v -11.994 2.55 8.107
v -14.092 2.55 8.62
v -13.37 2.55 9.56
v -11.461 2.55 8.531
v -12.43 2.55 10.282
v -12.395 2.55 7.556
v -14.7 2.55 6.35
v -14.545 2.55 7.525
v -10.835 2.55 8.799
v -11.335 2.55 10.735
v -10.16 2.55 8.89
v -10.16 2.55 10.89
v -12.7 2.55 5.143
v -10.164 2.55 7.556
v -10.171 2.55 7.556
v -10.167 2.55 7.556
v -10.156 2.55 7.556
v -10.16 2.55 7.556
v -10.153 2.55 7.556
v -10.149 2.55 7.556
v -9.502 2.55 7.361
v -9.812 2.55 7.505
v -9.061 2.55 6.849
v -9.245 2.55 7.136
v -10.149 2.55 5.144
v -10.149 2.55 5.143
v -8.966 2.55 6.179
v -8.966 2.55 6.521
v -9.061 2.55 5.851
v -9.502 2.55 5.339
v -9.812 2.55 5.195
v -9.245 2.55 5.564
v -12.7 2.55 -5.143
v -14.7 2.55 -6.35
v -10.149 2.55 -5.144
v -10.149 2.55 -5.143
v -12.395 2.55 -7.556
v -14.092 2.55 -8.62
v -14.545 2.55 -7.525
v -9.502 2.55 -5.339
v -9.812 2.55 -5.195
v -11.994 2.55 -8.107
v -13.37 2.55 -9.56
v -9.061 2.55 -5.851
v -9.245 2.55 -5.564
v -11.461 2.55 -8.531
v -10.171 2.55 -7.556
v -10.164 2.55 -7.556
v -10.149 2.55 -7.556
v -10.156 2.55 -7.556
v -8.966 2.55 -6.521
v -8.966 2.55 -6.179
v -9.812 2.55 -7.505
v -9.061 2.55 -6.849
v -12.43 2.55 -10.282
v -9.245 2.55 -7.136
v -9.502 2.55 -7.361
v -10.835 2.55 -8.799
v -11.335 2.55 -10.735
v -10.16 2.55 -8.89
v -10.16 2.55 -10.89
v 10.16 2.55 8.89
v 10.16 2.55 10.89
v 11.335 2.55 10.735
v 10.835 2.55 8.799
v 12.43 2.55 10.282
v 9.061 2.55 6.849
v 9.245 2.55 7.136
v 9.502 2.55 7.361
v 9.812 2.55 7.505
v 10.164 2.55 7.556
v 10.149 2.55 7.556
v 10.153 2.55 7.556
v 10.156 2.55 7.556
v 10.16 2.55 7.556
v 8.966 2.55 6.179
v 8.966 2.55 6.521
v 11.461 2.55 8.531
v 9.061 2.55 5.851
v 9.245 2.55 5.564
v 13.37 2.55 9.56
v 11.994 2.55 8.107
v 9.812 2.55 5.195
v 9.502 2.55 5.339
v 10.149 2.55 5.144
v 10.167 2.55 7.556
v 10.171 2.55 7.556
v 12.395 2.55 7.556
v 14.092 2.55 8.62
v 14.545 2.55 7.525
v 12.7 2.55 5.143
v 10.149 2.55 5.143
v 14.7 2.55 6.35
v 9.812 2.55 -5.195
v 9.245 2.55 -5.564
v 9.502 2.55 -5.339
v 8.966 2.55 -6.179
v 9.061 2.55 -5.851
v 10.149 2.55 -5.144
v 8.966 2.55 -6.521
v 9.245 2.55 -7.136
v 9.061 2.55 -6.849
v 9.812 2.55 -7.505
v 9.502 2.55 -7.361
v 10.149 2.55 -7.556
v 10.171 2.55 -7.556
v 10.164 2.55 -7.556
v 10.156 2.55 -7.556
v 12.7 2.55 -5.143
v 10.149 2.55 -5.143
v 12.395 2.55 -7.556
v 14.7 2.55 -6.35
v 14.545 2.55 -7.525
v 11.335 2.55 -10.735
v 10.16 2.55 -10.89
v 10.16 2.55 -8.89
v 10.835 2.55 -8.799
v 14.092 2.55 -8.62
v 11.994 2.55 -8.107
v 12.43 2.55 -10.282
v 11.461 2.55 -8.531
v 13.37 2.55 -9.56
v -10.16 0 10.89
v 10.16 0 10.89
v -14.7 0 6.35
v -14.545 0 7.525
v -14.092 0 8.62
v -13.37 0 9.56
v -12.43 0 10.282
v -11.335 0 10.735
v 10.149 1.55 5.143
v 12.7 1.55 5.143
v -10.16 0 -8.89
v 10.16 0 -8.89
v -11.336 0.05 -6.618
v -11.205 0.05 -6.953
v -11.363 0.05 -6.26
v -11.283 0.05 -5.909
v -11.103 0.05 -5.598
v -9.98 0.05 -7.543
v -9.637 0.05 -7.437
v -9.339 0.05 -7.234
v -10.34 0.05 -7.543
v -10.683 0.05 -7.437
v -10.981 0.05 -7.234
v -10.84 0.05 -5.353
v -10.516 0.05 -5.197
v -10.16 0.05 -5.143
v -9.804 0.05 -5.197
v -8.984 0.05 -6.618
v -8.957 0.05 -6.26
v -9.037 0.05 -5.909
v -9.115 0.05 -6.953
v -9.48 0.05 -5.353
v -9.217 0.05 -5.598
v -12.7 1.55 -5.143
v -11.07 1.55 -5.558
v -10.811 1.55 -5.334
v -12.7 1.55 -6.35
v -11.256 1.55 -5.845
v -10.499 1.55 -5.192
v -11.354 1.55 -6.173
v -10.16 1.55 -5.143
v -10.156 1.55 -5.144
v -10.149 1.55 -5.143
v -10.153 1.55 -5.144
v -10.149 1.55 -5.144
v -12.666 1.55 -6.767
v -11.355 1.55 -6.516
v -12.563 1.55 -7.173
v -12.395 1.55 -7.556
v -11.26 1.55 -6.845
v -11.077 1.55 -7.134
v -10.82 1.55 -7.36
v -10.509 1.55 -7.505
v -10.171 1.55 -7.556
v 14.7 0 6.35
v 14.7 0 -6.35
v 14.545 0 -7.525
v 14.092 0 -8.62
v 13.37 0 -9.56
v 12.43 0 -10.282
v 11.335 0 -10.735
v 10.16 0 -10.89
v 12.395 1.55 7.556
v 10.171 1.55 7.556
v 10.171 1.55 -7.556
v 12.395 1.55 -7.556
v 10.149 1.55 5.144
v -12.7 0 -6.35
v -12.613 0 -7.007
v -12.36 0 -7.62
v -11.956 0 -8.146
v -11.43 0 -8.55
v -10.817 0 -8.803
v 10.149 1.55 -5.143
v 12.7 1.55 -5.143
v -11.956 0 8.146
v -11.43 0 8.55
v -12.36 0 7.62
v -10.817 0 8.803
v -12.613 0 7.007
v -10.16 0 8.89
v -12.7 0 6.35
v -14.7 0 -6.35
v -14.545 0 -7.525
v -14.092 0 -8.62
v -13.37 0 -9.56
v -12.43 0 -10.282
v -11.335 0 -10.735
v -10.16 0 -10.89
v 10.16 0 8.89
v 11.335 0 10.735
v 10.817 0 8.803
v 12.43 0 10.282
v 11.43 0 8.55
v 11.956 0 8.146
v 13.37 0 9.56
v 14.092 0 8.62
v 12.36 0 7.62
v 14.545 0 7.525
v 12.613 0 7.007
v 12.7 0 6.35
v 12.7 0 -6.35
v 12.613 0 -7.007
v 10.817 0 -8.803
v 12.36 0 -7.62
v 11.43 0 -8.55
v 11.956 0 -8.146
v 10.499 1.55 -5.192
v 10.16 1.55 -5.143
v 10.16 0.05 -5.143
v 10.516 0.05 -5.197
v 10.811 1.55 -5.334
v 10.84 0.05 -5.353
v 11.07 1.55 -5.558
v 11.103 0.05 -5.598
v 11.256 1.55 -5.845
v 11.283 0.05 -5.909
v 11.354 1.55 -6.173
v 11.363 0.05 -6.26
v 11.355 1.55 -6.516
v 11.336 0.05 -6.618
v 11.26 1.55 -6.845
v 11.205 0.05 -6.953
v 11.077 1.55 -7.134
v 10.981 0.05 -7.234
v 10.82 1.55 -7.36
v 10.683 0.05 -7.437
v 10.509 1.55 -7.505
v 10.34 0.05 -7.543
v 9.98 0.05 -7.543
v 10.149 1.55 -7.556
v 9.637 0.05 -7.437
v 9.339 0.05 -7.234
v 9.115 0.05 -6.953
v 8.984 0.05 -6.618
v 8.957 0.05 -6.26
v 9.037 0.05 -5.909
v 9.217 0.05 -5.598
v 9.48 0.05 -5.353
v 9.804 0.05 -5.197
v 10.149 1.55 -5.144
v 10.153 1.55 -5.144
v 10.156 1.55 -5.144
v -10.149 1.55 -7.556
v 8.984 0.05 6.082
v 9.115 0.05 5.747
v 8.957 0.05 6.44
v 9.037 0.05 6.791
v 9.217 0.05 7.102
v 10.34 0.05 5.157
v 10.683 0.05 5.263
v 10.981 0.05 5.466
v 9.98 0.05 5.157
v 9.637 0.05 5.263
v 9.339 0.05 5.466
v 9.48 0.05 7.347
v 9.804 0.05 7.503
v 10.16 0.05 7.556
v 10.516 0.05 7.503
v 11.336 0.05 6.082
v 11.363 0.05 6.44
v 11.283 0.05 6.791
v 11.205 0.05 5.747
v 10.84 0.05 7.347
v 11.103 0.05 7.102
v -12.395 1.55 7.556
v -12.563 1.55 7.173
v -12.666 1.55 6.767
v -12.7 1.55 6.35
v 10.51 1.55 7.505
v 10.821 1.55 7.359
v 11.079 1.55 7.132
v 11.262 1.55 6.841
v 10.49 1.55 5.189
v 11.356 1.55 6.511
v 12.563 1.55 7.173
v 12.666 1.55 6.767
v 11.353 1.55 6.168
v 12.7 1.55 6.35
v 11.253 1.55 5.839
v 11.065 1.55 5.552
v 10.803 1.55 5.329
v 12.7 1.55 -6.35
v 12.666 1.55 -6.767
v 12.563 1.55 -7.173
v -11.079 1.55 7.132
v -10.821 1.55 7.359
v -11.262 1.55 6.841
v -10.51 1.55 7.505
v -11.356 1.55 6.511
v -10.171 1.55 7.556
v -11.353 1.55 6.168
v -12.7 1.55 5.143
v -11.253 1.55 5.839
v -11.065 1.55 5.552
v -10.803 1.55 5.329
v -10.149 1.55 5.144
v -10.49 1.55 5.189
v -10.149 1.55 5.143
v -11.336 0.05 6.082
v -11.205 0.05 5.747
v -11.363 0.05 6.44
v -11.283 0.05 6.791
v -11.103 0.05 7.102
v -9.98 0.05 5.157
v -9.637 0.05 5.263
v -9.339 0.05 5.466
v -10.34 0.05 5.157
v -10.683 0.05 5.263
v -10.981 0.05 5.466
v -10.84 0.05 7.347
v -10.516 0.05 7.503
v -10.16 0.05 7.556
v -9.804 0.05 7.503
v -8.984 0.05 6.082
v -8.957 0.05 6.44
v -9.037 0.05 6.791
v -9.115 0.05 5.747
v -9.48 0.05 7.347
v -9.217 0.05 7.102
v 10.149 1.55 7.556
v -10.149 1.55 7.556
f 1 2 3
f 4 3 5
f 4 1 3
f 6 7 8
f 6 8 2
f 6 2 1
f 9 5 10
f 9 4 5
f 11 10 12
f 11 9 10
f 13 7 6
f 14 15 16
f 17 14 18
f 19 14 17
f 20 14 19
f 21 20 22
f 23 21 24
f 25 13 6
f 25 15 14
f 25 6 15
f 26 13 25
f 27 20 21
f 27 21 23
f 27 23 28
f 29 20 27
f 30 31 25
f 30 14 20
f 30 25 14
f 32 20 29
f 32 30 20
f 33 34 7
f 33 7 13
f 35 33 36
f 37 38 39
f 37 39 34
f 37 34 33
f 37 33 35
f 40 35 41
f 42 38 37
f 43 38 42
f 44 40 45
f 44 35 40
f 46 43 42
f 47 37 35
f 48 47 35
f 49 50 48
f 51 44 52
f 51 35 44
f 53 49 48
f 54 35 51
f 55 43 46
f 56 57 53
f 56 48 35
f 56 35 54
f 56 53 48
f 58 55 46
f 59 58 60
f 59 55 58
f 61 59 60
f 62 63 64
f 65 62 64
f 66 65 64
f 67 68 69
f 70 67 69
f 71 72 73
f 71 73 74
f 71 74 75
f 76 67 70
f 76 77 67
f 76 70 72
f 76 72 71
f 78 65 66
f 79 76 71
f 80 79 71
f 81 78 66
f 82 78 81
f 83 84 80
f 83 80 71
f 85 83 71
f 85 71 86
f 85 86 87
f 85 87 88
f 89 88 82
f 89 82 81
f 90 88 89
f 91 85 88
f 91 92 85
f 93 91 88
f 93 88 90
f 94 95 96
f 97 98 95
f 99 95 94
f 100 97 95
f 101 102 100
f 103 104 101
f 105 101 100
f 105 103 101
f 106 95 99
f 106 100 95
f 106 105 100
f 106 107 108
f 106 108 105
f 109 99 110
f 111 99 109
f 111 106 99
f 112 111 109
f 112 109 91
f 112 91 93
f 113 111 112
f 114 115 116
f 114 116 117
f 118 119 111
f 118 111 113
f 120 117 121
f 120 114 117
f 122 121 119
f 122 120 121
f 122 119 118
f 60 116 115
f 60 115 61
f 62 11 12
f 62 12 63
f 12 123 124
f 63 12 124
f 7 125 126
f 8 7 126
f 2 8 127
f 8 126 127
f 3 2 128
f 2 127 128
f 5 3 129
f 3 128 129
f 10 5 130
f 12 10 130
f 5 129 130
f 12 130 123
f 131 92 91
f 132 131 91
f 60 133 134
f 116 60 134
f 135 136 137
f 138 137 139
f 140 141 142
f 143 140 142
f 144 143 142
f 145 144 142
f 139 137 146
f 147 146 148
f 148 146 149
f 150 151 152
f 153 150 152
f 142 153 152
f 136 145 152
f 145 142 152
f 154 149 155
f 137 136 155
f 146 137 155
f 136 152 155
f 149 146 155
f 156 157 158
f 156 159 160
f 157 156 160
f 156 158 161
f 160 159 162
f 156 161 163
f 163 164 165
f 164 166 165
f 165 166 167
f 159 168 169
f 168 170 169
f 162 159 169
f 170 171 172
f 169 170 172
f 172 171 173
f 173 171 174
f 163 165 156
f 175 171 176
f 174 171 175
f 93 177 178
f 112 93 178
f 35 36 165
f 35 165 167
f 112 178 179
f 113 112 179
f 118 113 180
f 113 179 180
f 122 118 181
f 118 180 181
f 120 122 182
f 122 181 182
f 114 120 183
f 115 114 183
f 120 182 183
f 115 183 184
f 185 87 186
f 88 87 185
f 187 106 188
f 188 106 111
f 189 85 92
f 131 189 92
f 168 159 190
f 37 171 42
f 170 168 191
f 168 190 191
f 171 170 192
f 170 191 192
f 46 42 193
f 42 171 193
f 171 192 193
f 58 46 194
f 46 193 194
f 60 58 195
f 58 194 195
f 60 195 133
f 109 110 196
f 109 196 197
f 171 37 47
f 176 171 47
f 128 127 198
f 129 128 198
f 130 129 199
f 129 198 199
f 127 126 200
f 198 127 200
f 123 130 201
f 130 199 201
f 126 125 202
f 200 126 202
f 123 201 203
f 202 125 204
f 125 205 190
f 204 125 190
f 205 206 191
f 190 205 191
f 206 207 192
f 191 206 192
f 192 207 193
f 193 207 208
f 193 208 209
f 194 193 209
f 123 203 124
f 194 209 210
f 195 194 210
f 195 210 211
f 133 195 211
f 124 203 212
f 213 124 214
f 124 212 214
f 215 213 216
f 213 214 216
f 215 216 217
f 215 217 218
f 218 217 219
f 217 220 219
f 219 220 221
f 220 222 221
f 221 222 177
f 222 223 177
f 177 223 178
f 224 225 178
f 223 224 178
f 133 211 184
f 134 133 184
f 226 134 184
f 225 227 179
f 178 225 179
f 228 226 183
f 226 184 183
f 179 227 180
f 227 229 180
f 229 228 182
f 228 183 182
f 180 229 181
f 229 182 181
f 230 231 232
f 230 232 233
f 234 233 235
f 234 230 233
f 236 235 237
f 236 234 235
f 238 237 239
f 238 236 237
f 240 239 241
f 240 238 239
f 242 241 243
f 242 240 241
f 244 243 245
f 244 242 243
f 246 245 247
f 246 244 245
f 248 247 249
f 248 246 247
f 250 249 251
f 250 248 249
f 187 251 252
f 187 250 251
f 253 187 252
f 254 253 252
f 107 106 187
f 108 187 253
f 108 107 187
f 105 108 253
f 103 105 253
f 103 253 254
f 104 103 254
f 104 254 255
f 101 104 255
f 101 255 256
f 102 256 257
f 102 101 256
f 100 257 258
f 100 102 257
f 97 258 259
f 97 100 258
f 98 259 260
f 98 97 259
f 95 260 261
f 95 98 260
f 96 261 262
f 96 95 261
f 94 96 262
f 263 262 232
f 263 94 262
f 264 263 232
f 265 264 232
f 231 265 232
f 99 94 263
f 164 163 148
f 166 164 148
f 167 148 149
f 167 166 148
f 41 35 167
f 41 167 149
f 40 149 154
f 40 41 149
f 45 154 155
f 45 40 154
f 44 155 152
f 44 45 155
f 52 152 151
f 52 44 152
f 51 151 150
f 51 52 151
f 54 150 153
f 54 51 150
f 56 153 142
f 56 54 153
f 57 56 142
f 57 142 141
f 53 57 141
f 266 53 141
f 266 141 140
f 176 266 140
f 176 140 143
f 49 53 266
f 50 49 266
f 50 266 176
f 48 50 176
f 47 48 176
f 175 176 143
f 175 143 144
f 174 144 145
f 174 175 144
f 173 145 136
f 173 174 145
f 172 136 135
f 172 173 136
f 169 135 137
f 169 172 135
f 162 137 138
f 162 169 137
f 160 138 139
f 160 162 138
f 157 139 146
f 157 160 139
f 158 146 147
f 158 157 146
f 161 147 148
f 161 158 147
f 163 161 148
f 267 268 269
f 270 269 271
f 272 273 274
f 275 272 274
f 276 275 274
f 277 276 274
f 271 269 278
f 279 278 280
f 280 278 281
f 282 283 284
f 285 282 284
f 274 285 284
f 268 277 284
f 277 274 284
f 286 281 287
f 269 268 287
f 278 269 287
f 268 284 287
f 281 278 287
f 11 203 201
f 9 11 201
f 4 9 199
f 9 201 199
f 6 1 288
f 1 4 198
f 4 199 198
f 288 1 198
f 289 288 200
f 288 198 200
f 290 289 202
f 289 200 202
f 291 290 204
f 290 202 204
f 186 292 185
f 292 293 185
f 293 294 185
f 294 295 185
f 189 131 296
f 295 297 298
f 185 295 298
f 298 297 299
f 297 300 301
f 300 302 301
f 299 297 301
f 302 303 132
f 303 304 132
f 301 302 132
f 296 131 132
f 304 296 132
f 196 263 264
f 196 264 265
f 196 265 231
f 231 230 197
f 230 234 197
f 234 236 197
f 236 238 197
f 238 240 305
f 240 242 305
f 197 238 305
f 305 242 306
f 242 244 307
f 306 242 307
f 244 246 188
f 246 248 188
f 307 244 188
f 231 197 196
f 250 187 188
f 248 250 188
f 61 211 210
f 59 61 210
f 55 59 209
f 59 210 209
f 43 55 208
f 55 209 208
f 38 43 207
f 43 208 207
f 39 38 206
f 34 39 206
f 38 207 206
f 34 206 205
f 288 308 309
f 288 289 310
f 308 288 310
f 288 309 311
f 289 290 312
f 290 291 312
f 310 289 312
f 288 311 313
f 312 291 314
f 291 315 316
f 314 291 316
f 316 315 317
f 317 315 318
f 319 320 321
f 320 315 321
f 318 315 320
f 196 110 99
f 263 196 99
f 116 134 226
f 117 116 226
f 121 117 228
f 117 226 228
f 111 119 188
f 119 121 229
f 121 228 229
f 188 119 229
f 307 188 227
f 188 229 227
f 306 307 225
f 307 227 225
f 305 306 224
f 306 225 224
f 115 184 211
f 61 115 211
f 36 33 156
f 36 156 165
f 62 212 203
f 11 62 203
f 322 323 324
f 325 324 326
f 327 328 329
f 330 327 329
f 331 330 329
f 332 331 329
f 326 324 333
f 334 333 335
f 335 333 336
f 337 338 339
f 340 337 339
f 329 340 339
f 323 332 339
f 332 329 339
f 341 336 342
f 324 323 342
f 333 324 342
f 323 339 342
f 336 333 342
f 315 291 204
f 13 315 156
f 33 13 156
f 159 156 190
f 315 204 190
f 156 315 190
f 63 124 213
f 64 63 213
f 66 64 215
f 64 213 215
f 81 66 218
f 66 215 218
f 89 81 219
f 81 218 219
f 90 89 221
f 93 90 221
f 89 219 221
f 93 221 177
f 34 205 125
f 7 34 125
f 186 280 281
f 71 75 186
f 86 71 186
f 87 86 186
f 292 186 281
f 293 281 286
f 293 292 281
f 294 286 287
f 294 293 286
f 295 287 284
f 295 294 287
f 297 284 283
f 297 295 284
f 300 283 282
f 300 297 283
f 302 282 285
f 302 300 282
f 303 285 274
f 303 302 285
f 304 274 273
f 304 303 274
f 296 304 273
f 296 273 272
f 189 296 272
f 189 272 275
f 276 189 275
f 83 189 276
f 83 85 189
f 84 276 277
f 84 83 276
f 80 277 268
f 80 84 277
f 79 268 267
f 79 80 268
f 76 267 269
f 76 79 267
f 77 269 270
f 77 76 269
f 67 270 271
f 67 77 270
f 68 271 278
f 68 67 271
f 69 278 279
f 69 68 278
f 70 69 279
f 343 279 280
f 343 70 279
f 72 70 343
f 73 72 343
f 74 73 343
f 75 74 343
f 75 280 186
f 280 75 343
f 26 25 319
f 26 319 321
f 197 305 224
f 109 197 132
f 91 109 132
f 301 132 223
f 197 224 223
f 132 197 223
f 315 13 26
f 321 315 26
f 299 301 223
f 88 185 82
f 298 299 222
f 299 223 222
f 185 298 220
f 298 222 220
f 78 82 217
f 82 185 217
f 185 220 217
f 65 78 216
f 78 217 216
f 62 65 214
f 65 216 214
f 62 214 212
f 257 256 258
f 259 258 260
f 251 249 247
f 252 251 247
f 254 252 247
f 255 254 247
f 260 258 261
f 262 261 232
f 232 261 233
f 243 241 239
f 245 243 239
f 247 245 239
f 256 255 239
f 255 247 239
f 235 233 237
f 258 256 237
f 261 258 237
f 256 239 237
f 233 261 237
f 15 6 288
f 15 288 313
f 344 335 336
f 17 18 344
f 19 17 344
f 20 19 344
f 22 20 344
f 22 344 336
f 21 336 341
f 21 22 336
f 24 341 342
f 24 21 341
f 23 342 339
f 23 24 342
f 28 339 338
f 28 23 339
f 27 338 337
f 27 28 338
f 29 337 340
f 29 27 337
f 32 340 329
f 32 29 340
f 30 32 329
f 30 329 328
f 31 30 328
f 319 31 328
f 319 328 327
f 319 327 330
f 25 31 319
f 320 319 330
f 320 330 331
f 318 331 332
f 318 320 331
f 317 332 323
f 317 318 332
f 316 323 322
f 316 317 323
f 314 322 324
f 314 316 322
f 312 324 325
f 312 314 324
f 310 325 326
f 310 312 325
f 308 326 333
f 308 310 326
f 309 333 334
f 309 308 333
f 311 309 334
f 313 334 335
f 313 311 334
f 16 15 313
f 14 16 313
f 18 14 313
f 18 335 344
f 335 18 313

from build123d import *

# Parameters (mm, degrees)
BOSS_EXTRUDE1_DEPTH   = 2.55
SKETCH2_R             = 1.2065
BOSS_EXTRUDE2_DEPTH   = 2.5
BOSS_EXTRUDE2_2_DEPTH = 2.5
BOSS_EXTRUDE2_3_DEPTH = 2.5
BOSS_EXTRUDE2_4_DEPTH = 2.5
SKETCH3_W             = 2.550724021
SKETCH3_H             = 2.413
BOSS_EXTRUDE3_DEPTH   = 1


with BuildPart() as part:
    # Sketch1 → Boss-Extrude1 (new body)
    with BuildSketch(Plane(origin=(0, 0, 0), x_dir=(1, 0, 0), z_dir=(0, 1, 0))):
        with BuildLine():
            Line((-14.7, 6.35), (-14.7, -6.35))
            ThreePointArc((-14.7, -6.35), (-13.370264787, -9.560264787), (-10.16, -10.89))
            Line((-10.16, -10.89), (10.16, -10.89))
            ThreePointArc((10.16, -10.89), (13.370264787, -9.560264787), (14.7, -6.35))
            Line((14.7, -6.35), (14.7, 6.35))
            ThreePointArc((14.7, 6.35), (13.370264787, 9.560264787), (10.16, 10.89))
            Line((10.16, 10.89), (-10.16, 10.89))
            ThreePointArc((-10.16, 10.89), (-13.370264787, 9.560264787), (-14.7, 6.35))
        make_face()
        with BuildLine():
            Line((-10.16, 8.89), (10.16, 8.89))
            ThreePointArc((10.16, 8.89), (11.956051224, 8.146051224), (12.7, 6.35))
            Line((12.7, 6.35), (12.7, -6.35))
            ThreePointArc((12.7, -6.35), (11.956051224, -8.146051224), (10.16, -8.89))
            Line((10.16, -8.89), (-10.16, -8.89))
            ThreePointArc((-10.16, -8.89), (-11.956051224, -8.146051224), (-12.7, -6.35))
            Line((-12.7, -6.35), (-12.7, 6.35))
            ThreePointArc((-12.7, 6.35), (-11.956051224, 8.146051224), (-10.16, 8.89))
        make_face(mode=Mode.SUBTRACT)
    extrude(amount=BOSS_EXTRUDE1_DEPTH)



with BuildPart() as body_2:
    # Sketch2 → Boss-Extrude2 (new body)
    with BuildSketch(Plane(origin=(0, 2.55, 0), x_dir=(1, 0, 0), z_dir=(0, 1, 0))):
        with Locations(Location((10.16, 6.35, 0), (0, 0, 270))):
            Circle(SKETCH2_R)
    extrude(amount=-BOSS_EXTRUDE2_DEPTH)


with BuildPart() as body_3:
    # Sketch2 → Boss-Extrude2 2 (new body)
    with BuildSketch(Plane(origin=(0, 2.55, 0), x_dir=(1, 0, 0), z_dir=(0, 1, 0))):
        with Locations(Location((-10.16, 6.35, 0), (0, 0, 270))):
            Circle(SKETCH2_R)
    extrude(amount=-BOSS_EXTRUDE2_2_DEPTH)


with BuildPart() as body_4:
    # Sketch2 → Boss-Extrude2 3 (new body)
    with BuildSketch(Plane(origin=(0, 2.55, 0), x_dir=(1, 0, 0), z_dir=(0, 1, 0))):
        with Locations(Location((-10.16, -6.35, 0), (0, 0, 270))):
            Circle(SKETCH2_R)
    extrude(amount=-BOSS_EXTRUDE2_3_DEPTH)


with BuildPart() as body_5:
    # Sketch2 → Boss-Extrude2 4 (new body)
    with BuildSketch(Plane(origin=(0, 2.55, 0), x_dir=(1, 0, 0), z_dir=(0, 1, 0))):
        with Locations(Location((10.16, -6.35, 0), (0, 0, 270))):
            Circle(SKETCH2_R)
    extrude(amount=-BOSS_EXTRUDE2_4_DEPTH)


with BuildPart() as part_1:
    add(part.part)

    add(body_2.part)  # Boss-Extrude3 merges body 2

    add(body_3.part)  # Boss-Extrude3 merges body 3

    add(body_4.part)  # Boss-Extrude3 merges body 4

    add(body_5.part)  # Boss-Extrude3 merges body 5
    # Sketch3 → Boss-Extrude3 (add)
    with BuildSketch(Plane(origin=(0, 2.55, 0), x_dir=(1, 0, 0), z_dir=(0, 1, 0))):
        with Locations((-11.42463799, 6.349952339)):
            Rectangle(SKETCH3_W, SKETCH3_H)
        with Locations((11.42463799, 6.349952339)):
            Rectangle(SKETCH3_W, SKETCH3_H)
        with Locations((11.42463799, -6.349952339)):
            Rectangle(SKETCH3_W, SKETCH3_H)
        with Locations((-11.42463799, -6.349952339)):
            Rectangle(SKETCH3_W, SKETCH3_H)
    extrude(amount=-BOSS_EXTRUDE3_DEPTH)


solid = part_1.part
